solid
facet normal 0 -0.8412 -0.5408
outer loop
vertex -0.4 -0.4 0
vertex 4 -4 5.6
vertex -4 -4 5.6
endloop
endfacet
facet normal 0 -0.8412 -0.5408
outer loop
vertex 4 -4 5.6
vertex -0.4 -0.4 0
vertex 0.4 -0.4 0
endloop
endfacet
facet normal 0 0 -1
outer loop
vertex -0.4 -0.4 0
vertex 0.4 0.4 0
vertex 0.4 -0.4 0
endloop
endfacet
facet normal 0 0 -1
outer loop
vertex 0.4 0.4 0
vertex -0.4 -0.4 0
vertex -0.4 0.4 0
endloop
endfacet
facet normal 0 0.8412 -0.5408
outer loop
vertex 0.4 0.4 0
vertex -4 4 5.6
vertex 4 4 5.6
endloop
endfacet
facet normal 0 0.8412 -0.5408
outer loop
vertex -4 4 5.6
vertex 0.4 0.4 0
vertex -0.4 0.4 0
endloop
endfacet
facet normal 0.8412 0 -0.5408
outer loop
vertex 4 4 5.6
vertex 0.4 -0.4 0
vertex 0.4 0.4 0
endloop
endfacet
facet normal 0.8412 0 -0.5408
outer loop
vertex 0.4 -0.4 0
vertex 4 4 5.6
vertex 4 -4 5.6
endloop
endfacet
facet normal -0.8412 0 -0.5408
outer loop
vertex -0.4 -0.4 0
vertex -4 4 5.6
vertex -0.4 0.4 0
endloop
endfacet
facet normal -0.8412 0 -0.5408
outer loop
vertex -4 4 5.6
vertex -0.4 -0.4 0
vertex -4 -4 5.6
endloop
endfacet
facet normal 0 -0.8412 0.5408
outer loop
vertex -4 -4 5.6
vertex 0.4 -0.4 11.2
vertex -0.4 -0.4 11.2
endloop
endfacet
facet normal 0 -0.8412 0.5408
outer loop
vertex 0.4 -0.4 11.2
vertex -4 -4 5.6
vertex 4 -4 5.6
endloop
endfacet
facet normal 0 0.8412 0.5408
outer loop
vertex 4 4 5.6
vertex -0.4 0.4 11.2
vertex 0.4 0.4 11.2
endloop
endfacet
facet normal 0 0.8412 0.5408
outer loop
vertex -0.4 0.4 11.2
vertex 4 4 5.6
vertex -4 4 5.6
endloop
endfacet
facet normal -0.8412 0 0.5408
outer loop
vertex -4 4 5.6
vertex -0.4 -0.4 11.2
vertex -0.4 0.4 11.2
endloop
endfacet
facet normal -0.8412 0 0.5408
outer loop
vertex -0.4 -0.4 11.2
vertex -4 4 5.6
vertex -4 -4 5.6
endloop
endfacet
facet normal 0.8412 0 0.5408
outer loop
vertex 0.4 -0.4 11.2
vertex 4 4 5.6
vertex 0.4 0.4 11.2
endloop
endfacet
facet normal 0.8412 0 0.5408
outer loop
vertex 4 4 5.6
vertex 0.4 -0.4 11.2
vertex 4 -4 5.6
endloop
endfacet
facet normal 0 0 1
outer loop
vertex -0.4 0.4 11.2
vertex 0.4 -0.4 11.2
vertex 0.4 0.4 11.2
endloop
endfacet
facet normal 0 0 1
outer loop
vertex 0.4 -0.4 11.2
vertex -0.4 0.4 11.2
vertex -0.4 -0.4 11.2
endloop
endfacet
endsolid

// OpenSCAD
// studs/diamond.scad — bipyramid (two pyramids base-to-base).
// MIT licensed.
//
// The widest cross-section sits halfway up; tip and base are both points
// (or flattened by tip_radius). Reads more "gem" than "punk" — both have
// their moments.

module stud_diamond(size = 6, tip_radius = 0.4, height = undef) {
    h = is_undef(height) ? size * 1.4 : height;
    base_r = (size / 2) * sqrt(2);
    top_r  = tip_radius > 0 ? tip_radius * sqrt(2) : 0;

    rotate([0, 0, 45])
        union() {
            // lower half: point at z=0, widest at z=h/2
            cylinder(h = h / 2, r1 = top_r, r2 = base_r, $fn = 4);
            // upper half: widest at z=h/2, point at z=h
            translate([0, 0, h / 2])
                cylinder(h = h / 2, r1 = base_r, r2 = top_r, $fn = 4);
        }
}

stud_diamond(size = 8, tip_radius = 0.4);
